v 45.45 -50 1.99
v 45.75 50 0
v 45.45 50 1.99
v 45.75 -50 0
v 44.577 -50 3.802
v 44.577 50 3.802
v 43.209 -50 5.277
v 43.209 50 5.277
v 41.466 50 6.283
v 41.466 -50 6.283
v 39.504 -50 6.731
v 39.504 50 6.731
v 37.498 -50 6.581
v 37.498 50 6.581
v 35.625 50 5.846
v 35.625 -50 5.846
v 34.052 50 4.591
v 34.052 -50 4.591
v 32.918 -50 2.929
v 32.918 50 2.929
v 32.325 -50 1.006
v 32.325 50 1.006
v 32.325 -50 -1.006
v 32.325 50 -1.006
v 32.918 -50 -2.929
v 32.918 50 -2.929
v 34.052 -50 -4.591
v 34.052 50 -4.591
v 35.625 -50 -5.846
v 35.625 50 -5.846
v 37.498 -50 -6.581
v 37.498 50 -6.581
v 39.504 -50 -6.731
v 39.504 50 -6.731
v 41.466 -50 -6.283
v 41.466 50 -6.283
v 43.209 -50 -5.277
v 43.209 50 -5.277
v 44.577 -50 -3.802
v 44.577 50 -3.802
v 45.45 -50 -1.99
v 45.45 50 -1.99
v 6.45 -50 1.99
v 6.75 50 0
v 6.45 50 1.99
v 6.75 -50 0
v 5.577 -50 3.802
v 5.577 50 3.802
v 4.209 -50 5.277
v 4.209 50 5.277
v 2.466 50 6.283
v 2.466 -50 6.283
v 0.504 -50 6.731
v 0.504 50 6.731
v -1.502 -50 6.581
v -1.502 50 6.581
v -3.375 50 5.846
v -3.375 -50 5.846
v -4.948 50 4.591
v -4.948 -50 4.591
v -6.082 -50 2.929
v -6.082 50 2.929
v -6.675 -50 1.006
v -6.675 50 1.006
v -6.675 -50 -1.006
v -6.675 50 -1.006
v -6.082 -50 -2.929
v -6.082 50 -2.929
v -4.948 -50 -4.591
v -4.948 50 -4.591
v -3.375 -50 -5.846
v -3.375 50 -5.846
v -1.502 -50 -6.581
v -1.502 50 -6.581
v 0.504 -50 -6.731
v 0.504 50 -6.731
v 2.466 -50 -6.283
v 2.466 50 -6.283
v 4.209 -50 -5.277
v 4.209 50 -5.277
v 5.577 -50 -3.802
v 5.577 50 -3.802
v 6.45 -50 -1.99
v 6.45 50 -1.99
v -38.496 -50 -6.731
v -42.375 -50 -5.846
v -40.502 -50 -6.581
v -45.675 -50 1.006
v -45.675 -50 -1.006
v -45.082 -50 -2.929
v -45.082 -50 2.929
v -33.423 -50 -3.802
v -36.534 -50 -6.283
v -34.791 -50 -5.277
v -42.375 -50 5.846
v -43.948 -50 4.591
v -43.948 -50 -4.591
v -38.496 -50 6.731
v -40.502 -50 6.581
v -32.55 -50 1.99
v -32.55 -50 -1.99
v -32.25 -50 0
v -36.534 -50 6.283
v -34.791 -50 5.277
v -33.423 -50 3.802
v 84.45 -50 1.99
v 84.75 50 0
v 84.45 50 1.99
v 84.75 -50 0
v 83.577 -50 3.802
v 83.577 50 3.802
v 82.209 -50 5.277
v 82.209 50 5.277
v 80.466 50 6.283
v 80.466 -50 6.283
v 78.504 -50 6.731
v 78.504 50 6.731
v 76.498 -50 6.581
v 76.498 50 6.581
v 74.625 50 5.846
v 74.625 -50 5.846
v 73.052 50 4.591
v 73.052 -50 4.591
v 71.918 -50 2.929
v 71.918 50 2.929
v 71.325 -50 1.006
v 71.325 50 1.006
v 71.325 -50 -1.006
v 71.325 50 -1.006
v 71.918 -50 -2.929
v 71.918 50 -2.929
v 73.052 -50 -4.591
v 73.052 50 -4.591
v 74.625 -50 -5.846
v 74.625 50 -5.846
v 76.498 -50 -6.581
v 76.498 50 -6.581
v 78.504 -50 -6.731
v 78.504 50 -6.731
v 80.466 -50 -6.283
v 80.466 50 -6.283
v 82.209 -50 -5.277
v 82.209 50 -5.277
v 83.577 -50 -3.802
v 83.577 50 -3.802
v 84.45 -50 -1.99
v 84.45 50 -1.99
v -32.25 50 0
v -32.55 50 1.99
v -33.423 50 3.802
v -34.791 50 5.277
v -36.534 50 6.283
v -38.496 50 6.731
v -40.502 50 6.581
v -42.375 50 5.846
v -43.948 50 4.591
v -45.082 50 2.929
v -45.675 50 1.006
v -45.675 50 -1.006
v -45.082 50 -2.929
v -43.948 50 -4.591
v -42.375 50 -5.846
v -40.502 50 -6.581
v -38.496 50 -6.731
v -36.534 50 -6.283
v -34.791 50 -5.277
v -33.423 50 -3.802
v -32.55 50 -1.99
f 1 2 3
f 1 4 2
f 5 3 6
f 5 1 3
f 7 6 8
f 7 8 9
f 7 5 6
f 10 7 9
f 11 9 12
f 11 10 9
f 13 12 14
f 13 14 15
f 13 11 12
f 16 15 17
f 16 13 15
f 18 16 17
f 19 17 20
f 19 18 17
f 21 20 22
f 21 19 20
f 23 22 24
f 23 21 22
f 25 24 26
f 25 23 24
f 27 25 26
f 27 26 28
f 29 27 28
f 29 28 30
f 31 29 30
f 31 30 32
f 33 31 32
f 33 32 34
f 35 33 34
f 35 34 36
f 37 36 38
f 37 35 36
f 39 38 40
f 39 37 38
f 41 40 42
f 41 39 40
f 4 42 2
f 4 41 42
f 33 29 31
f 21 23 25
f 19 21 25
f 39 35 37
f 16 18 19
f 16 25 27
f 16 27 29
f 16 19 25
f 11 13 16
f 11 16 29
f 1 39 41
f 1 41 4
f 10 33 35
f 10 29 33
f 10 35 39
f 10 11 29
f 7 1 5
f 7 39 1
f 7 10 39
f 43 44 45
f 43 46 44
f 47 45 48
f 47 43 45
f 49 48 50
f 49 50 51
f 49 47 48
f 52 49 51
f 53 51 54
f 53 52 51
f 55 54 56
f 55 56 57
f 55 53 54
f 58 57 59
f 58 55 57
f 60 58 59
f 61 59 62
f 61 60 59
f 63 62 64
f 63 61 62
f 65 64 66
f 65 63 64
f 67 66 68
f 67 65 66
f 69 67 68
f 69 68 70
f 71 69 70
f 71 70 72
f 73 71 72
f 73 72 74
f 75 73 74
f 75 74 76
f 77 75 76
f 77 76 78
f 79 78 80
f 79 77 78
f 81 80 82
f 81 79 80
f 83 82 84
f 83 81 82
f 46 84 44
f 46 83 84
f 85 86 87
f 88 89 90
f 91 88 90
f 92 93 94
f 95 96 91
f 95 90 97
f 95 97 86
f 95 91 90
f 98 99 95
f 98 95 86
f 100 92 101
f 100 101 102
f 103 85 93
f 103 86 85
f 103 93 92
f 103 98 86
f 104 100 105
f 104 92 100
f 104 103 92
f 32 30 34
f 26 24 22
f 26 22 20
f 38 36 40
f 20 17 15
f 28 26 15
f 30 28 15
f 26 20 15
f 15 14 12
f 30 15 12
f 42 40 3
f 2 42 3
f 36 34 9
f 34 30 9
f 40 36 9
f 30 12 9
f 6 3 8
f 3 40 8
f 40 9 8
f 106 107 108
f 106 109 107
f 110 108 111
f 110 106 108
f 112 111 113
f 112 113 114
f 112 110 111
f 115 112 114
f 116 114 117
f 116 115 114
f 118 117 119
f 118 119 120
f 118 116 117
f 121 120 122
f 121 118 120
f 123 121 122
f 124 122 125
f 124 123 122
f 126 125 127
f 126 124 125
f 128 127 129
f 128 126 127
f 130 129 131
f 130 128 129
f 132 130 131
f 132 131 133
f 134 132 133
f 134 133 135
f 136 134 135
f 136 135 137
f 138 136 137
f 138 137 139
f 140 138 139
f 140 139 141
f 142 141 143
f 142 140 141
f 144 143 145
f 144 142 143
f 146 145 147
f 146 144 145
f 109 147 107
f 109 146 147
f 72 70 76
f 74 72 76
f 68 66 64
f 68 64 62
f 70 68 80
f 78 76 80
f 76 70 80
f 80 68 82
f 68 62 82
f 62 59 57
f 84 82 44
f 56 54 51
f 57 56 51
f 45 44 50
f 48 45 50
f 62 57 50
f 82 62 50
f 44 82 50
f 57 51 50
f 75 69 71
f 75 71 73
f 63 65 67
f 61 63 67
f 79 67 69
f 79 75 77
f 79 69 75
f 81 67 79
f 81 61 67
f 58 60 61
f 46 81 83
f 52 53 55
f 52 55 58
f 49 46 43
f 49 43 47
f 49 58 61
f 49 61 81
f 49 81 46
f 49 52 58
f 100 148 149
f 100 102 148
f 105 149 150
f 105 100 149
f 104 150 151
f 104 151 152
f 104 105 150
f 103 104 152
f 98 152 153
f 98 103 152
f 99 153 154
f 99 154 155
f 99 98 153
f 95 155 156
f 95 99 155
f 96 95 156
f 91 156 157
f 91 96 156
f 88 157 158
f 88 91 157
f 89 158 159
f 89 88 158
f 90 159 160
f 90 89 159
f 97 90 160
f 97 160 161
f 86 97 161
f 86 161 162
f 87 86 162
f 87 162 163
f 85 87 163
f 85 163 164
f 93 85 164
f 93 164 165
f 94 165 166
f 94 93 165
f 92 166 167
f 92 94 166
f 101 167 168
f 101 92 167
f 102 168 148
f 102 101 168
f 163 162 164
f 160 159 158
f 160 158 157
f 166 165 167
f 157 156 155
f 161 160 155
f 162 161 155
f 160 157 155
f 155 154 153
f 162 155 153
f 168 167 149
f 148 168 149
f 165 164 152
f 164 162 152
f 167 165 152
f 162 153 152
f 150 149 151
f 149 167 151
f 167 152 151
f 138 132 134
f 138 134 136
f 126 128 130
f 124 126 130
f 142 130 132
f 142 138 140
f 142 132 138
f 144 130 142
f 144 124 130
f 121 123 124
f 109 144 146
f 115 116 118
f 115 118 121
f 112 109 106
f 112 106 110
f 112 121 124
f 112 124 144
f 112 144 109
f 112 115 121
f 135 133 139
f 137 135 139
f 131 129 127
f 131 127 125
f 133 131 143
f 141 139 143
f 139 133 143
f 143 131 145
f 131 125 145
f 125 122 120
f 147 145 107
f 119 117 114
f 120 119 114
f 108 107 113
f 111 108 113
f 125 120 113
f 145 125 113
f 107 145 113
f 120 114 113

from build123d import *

# Parameters (mm, degrees)
F0_R          = 6.75
F1_DEPTH      = 50
F1_DEPTH_BACK = 50


with BuildPart() as f1:
    # F0 (on Front) → F1 (new body, two sides)
    with BuildSketch(Plane.XZ) as f1_sk:
        Circle(F0_R)
        with Locations((39, 0)):
            Circle(F0_R)
        with Locations((-39, 0)):
            Circle(F0_R)
        with Locations((78, 0)):
            Circle(F0_R)
    extrude(amount=F1_DEPTH)
    extrude(f1_sk.sketch, amount=-F1_DEPTH_BACK)


solid = f1.part
